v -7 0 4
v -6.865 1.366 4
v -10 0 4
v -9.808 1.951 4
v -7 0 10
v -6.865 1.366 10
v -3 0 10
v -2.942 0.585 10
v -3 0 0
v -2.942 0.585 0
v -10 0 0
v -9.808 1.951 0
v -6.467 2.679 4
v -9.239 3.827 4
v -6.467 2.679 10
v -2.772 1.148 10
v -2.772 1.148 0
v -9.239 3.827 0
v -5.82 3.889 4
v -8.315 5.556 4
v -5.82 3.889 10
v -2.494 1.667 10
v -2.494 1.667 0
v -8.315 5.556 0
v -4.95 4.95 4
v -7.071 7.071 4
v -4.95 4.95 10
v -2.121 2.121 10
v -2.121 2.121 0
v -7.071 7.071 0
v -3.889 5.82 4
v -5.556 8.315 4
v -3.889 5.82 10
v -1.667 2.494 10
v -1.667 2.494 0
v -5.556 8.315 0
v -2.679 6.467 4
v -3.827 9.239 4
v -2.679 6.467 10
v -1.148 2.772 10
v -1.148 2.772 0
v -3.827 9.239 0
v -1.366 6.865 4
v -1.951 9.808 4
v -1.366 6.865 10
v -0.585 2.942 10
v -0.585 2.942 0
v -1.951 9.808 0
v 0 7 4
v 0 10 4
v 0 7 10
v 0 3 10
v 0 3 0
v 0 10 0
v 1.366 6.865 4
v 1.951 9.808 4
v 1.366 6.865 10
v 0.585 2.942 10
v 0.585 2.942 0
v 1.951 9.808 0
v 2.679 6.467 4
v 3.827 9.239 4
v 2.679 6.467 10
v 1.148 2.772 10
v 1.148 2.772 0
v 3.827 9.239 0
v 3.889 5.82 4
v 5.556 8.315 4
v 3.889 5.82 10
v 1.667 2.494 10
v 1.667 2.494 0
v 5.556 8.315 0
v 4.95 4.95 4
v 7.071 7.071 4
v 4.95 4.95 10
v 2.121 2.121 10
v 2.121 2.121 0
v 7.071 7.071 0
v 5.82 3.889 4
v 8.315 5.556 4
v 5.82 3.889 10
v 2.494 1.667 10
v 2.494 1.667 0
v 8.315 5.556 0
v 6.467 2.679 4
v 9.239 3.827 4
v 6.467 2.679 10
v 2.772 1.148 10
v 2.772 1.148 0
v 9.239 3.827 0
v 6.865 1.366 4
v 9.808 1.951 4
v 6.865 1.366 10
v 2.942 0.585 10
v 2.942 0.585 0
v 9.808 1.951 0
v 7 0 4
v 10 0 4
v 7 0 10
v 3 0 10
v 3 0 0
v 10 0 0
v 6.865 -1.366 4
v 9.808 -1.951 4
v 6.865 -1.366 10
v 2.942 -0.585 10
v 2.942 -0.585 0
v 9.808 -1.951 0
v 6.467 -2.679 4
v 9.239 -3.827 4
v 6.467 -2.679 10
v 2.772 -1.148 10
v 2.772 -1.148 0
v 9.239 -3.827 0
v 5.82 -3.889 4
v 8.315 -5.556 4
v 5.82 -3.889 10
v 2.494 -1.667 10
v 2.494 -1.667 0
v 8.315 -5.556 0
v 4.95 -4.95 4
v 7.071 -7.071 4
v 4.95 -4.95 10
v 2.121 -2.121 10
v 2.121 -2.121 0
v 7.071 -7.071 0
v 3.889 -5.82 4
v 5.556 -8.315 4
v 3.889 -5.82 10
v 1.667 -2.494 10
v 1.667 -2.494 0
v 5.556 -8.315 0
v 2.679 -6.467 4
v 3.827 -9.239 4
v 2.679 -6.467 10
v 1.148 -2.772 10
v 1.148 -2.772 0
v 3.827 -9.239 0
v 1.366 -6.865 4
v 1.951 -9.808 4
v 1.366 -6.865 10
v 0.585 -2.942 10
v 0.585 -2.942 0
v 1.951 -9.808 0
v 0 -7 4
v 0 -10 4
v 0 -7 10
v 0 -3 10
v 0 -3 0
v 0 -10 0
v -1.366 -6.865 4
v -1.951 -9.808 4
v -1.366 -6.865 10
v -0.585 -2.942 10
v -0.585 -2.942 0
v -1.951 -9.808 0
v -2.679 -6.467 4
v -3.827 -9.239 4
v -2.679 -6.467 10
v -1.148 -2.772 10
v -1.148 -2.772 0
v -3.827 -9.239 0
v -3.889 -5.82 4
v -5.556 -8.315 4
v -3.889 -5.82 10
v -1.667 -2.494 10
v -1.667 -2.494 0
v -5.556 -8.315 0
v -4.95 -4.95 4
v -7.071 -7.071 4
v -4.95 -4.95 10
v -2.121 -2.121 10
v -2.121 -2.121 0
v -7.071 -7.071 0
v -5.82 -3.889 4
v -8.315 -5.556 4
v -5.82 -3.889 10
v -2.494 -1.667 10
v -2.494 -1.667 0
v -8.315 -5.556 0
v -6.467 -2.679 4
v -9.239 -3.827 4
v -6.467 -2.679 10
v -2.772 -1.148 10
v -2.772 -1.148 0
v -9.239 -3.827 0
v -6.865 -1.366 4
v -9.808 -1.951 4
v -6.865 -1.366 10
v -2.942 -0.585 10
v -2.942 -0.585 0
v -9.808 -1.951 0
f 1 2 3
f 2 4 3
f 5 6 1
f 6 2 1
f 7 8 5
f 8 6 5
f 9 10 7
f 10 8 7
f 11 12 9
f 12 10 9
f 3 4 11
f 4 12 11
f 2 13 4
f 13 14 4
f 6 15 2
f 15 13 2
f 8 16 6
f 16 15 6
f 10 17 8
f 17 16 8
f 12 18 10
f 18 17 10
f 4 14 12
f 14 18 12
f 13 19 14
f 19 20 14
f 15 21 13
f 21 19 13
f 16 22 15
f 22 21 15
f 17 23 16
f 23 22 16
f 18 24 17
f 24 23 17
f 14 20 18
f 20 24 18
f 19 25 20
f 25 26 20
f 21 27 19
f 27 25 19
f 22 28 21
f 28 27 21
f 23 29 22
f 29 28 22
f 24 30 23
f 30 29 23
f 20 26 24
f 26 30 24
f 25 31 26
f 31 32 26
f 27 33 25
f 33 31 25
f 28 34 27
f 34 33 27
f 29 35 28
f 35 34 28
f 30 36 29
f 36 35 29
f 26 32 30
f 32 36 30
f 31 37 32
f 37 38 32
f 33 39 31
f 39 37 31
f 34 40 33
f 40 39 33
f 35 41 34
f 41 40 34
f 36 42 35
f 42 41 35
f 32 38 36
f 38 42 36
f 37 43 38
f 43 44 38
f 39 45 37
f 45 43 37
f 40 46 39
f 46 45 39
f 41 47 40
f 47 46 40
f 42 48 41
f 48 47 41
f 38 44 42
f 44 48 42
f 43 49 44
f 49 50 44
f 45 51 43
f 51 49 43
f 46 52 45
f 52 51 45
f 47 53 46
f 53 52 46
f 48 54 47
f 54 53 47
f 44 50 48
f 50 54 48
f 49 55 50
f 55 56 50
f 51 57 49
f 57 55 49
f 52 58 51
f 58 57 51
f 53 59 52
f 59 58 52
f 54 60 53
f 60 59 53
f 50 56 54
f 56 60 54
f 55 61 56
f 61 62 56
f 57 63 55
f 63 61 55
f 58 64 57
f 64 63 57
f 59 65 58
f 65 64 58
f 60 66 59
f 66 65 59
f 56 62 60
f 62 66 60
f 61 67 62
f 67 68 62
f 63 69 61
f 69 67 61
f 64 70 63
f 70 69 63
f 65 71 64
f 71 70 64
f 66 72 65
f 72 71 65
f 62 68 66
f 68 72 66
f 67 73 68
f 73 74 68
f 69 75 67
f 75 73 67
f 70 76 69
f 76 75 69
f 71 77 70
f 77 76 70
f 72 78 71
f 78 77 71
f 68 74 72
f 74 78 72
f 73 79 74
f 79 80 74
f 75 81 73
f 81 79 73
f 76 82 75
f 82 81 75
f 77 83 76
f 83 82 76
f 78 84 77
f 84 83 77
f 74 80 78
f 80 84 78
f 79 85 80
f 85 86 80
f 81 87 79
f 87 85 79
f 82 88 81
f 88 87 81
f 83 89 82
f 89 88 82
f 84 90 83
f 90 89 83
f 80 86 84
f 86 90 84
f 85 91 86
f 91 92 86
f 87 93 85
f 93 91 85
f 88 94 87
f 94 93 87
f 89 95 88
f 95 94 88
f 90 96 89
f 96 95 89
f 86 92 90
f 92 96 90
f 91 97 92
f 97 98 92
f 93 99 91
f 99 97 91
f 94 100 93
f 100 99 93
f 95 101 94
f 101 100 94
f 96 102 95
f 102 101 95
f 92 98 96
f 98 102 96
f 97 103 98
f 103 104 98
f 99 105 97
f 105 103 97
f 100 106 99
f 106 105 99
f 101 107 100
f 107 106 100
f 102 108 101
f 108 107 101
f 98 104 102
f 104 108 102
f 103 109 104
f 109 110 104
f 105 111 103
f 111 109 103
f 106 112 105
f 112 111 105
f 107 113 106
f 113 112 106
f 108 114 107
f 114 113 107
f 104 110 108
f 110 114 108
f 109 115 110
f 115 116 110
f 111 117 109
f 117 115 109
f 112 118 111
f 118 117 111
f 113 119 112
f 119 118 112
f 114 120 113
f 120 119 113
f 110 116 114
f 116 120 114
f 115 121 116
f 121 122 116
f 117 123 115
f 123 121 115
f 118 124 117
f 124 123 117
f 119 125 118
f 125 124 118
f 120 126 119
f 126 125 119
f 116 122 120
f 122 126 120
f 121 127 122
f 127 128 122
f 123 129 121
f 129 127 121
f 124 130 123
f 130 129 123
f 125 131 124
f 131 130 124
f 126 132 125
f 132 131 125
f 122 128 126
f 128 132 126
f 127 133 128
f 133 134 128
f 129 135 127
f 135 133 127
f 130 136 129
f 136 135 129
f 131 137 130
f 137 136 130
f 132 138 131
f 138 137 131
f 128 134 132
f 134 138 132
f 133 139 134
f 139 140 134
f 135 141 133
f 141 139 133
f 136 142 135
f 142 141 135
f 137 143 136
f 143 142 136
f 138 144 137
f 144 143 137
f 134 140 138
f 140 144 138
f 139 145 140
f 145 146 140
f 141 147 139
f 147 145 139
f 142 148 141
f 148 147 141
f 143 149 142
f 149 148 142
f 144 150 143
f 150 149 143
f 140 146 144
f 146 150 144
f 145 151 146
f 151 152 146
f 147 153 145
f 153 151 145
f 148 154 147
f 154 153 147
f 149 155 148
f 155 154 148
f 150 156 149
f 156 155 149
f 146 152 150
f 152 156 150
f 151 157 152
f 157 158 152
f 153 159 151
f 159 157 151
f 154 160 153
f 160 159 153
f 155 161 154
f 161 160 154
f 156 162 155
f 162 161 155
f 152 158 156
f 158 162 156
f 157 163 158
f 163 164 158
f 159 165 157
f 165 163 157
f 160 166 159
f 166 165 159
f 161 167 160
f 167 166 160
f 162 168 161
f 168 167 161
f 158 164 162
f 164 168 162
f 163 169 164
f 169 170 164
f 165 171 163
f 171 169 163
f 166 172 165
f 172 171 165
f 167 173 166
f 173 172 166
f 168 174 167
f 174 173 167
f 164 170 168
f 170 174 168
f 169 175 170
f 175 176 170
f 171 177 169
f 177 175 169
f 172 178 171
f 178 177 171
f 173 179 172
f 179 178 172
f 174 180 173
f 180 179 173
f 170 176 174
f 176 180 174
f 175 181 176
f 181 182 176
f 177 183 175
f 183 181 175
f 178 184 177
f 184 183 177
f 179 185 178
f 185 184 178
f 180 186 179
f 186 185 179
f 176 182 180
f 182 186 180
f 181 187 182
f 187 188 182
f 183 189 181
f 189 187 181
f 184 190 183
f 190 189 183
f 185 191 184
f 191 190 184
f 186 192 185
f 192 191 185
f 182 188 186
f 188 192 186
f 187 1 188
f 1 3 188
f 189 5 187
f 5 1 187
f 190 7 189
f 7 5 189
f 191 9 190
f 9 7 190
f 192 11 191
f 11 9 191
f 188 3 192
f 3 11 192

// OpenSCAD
$fn = 32;

// ----------------------------------------------------------------------
// Arc stop: collar, 10 mm thick
// ----------------------------------------------------------------------

// --- parameters (mm) ---
revolve_angle = 360;      // full turn around the Z axis
profile_points = 6;       // points of the closed outline

profile = [[3, 0], [10, 0], [10, 4], [7, 4], [7, 10], [3, 10]];  // single closed polygon, 6 points, counter clockwise

// --- the one profile operation ---
rotate_extrude(angle = revolve_angle) polygon(points = profile);
